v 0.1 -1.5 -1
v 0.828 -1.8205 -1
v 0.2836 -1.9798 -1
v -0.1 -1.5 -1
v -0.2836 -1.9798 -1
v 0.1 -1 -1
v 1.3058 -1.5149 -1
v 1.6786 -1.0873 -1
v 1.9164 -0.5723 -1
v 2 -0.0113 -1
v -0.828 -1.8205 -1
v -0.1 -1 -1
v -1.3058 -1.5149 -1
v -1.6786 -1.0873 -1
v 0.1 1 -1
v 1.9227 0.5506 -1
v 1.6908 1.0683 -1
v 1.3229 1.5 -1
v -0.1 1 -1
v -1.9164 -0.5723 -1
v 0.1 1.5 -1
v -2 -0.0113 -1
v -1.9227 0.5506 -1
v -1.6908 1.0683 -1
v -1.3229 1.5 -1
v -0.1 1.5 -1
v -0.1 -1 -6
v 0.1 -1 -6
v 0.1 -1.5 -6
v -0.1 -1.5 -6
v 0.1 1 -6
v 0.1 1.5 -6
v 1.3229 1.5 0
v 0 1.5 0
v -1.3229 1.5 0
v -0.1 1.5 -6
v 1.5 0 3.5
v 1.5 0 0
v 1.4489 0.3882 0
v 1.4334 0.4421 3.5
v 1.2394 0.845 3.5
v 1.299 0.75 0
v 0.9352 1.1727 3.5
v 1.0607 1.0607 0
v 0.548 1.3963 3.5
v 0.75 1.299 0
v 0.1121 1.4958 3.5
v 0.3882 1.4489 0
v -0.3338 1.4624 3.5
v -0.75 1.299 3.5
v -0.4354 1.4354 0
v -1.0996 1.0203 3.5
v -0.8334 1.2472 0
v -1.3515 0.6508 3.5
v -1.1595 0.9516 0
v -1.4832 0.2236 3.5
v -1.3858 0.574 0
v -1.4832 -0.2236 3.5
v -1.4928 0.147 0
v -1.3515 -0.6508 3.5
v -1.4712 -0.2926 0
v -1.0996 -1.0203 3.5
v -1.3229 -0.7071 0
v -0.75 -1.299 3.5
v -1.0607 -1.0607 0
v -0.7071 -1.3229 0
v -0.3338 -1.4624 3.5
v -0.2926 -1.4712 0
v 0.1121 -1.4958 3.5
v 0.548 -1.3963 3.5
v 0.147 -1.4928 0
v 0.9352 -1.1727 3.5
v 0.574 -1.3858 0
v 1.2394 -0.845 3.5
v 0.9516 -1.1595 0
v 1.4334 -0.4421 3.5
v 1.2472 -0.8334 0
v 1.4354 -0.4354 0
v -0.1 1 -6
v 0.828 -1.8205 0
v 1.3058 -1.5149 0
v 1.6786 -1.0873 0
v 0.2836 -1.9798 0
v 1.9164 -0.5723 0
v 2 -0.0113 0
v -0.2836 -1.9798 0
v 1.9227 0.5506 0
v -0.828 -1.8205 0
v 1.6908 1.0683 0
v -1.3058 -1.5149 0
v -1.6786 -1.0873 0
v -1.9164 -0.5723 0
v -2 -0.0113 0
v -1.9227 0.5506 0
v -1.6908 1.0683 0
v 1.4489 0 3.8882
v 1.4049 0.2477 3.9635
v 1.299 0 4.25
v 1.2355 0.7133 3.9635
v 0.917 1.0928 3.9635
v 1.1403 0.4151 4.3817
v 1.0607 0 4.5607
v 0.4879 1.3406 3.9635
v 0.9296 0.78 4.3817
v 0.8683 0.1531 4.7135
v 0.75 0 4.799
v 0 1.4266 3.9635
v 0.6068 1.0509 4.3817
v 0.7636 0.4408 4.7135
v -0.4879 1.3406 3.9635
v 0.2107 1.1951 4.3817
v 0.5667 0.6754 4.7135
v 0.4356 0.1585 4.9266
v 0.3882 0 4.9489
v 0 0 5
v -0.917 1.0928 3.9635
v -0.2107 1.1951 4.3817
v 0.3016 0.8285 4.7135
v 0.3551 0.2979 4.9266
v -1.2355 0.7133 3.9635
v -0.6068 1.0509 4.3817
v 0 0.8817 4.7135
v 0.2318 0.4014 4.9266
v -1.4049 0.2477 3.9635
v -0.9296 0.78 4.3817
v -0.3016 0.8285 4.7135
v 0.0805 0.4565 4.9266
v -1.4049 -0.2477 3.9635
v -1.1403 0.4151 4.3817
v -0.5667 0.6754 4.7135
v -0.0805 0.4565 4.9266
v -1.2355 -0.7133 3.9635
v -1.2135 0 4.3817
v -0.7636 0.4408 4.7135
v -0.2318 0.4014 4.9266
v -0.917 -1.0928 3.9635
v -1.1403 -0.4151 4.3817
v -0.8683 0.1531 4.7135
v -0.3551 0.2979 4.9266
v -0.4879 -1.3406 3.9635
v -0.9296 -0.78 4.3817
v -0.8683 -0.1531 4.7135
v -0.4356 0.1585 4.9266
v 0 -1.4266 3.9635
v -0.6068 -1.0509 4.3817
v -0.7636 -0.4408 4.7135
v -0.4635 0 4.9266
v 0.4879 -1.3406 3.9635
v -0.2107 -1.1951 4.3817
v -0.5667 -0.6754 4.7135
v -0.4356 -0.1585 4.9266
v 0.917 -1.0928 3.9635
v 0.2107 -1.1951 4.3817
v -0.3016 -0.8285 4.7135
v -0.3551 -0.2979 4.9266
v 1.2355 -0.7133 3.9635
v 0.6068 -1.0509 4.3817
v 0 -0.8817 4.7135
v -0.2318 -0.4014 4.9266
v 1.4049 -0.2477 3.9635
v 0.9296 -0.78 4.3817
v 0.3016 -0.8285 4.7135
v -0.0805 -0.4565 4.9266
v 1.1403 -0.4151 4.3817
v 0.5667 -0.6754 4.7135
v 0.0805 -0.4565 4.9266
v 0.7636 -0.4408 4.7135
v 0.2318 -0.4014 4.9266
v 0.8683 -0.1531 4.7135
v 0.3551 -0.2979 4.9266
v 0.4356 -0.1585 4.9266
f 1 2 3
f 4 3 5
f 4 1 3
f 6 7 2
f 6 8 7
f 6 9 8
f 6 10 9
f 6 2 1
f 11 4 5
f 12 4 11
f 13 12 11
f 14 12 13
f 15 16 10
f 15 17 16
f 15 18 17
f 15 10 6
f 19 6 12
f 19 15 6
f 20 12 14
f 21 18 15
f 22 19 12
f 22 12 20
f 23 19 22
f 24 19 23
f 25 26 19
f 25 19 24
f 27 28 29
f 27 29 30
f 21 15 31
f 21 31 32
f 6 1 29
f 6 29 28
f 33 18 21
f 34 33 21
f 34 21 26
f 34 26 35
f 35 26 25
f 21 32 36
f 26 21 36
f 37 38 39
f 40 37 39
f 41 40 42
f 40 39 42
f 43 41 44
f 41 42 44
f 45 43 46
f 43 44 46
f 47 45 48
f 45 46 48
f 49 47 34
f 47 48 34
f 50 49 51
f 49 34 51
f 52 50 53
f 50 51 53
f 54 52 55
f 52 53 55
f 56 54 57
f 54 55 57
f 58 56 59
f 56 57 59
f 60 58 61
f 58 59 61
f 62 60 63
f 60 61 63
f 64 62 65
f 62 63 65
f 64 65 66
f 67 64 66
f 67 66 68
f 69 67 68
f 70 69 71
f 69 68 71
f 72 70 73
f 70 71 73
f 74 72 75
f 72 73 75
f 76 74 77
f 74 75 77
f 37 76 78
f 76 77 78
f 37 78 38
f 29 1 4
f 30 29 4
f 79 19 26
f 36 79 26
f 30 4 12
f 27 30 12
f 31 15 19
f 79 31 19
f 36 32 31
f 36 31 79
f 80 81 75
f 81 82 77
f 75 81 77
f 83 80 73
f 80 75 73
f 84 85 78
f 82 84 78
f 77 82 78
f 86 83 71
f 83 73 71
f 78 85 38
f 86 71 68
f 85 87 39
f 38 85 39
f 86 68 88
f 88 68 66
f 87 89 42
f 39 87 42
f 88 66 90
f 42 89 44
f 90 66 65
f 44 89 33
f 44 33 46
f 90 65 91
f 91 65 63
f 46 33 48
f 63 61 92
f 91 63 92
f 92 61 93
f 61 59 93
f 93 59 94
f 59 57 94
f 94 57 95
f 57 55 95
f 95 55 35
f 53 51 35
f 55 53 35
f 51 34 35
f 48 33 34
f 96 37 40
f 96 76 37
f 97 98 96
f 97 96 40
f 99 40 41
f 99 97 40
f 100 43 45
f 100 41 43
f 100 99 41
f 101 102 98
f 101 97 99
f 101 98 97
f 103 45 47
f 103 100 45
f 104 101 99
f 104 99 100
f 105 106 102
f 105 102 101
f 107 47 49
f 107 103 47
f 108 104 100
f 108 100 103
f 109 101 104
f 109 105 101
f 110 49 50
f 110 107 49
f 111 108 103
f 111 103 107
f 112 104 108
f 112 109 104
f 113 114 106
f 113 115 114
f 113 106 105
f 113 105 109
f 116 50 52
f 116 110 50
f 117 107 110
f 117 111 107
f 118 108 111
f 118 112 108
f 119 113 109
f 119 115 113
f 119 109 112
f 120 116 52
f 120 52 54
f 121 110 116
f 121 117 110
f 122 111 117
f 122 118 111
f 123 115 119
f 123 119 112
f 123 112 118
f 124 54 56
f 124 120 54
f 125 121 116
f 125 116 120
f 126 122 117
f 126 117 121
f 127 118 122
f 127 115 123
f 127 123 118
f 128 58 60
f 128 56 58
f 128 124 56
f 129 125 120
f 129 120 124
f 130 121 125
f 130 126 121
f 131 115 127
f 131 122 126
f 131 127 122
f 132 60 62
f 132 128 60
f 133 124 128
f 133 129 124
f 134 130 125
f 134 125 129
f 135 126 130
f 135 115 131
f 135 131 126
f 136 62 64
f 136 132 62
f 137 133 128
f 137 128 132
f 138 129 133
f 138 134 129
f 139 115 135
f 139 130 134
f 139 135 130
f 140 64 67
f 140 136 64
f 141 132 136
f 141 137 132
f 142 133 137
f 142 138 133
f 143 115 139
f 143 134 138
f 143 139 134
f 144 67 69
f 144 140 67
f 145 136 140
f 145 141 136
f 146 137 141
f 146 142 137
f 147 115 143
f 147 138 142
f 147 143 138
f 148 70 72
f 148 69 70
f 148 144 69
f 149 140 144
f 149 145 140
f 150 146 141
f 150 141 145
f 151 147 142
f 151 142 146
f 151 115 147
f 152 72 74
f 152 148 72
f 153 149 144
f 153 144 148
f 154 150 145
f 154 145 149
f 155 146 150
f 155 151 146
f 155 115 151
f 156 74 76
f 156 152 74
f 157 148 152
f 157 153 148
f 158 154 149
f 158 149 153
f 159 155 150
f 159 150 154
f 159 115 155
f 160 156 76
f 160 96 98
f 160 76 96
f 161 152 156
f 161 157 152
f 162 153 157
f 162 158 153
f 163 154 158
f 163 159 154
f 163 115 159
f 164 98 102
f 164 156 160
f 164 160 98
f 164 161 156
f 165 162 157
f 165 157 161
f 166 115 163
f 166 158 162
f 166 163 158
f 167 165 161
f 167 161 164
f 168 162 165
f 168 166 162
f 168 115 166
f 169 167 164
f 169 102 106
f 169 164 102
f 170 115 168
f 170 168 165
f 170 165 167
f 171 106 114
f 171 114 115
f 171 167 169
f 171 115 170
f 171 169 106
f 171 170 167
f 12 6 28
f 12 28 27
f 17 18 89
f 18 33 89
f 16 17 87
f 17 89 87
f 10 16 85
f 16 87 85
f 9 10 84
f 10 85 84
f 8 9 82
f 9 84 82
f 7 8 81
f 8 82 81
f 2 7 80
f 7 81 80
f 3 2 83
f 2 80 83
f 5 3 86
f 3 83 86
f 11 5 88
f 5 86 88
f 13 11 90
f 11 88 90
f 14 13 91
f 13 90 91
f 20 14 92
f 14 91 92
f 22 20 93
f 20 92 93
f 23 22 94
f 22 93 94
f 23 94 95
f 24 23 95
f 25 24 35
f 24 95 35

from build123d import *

# Parameters (mm, degrees)
SKETCH1_R               = 1.5
BASE_EXTRUDE_DEPTH      = 3.5
DOME1_FACE_RADIUS       = 1.5
DOME1_HEIGHT            = 1.5
SKETCH2_R               = 2
BOSS_EXTRUDE1_DEPTH     = 1
SKETCH3_W               = 0.2
SKETCH3_H               = 0.5
BOSS_EXTRUDE2_DEPTH     = 5
CUT_EXTRUDE1_DEPTH      = 6
CUT_EXTRUDE1_DEPTH_BACK = 7


with BuildPart() as part:
    # Sketch1 → Base-Extrude (new body)
    with BuildSketch(Plane.XY):
        Circle(SKETCH1_R)
    extrude(amount=BASE_EXTRUDE_DEPTH)

    # Dome1: a dome of height H over a round flat face of radius A is a cap of a sphere of radius (A * A + H * H) / (2 * H)
    dome1_r = (DOME1_FACE_RADIUS * DOME1_FACE_RADIUS + DOME1_HEIGHT * DOME1_HEIGHT) / (2 * DOME1_HEIGHT)
    dome1_base = Plane((0, 0, 3.5), z_dir=(0, 0, 1))
    with Locations(dome1_base.offset(DOME1_HEIGHT - dome1_r)):
        dome1_ball = Sphere(dome1_r, mode=Mode.PRIVATE)
    add(split(dome1_ball, bisect_by=dome1_base, keep=Keep.TOP, mode=Mode.PRIVATE))

    # Sketch2 → Boss-Extrude1 (add)
    with BuildSketch(Plane(origin=(0, 0, 0), x_dir=(-1, 0, 0), z_dir=(0, 0, -1))):
        Circle(SKETCH2_R)
    extrude(amount=BOSS_EXTRUDE1_DEPTH)

    # Sketch3 → Boss-Extrude2 (add)
    with BuildSketch(Plane(origin=(0, 0, -1), x_dir=(-1, 0, 0), z_dir=(0, 0, -1))):
        with Locations((0, 1.25)):
            Rectangle(SKETCH3_W, SKETCH3_H)
        with Locations((0, -1.25)):
            Rectangle(SKETCH3_W, SKETCH3_H)
    extrude(amount=BOSS_EXTRUDE2_DEPTH)

    # Sketch5 → Cut-Extrude1 (cut, two sides)
    with BuildSketch(Plane(origin=(0, 0, -1), x_dir=(-1, 0, 0), z_dir=(0, 0, -1))) as cut_extrude1_sk:
        Polygon((-20.975129822, 1.5), (-1.322875656, 1.5), (1.322875656, 1.5), (20.975129822, 1.5), (20.975129822, 40.804508332), (-20.975129822, 40.804508332), align=None)
    extrude(amount=CUT_EXTRUDE1_DEPTH, mode=Mode.SUBTRACT)
    extrude(cut_extrude1_sk.sketch, amount=-CUT_EXTRUDE1_DEPTH_BACK, mode=Mode.SUBTRACT)


solid = part.part
